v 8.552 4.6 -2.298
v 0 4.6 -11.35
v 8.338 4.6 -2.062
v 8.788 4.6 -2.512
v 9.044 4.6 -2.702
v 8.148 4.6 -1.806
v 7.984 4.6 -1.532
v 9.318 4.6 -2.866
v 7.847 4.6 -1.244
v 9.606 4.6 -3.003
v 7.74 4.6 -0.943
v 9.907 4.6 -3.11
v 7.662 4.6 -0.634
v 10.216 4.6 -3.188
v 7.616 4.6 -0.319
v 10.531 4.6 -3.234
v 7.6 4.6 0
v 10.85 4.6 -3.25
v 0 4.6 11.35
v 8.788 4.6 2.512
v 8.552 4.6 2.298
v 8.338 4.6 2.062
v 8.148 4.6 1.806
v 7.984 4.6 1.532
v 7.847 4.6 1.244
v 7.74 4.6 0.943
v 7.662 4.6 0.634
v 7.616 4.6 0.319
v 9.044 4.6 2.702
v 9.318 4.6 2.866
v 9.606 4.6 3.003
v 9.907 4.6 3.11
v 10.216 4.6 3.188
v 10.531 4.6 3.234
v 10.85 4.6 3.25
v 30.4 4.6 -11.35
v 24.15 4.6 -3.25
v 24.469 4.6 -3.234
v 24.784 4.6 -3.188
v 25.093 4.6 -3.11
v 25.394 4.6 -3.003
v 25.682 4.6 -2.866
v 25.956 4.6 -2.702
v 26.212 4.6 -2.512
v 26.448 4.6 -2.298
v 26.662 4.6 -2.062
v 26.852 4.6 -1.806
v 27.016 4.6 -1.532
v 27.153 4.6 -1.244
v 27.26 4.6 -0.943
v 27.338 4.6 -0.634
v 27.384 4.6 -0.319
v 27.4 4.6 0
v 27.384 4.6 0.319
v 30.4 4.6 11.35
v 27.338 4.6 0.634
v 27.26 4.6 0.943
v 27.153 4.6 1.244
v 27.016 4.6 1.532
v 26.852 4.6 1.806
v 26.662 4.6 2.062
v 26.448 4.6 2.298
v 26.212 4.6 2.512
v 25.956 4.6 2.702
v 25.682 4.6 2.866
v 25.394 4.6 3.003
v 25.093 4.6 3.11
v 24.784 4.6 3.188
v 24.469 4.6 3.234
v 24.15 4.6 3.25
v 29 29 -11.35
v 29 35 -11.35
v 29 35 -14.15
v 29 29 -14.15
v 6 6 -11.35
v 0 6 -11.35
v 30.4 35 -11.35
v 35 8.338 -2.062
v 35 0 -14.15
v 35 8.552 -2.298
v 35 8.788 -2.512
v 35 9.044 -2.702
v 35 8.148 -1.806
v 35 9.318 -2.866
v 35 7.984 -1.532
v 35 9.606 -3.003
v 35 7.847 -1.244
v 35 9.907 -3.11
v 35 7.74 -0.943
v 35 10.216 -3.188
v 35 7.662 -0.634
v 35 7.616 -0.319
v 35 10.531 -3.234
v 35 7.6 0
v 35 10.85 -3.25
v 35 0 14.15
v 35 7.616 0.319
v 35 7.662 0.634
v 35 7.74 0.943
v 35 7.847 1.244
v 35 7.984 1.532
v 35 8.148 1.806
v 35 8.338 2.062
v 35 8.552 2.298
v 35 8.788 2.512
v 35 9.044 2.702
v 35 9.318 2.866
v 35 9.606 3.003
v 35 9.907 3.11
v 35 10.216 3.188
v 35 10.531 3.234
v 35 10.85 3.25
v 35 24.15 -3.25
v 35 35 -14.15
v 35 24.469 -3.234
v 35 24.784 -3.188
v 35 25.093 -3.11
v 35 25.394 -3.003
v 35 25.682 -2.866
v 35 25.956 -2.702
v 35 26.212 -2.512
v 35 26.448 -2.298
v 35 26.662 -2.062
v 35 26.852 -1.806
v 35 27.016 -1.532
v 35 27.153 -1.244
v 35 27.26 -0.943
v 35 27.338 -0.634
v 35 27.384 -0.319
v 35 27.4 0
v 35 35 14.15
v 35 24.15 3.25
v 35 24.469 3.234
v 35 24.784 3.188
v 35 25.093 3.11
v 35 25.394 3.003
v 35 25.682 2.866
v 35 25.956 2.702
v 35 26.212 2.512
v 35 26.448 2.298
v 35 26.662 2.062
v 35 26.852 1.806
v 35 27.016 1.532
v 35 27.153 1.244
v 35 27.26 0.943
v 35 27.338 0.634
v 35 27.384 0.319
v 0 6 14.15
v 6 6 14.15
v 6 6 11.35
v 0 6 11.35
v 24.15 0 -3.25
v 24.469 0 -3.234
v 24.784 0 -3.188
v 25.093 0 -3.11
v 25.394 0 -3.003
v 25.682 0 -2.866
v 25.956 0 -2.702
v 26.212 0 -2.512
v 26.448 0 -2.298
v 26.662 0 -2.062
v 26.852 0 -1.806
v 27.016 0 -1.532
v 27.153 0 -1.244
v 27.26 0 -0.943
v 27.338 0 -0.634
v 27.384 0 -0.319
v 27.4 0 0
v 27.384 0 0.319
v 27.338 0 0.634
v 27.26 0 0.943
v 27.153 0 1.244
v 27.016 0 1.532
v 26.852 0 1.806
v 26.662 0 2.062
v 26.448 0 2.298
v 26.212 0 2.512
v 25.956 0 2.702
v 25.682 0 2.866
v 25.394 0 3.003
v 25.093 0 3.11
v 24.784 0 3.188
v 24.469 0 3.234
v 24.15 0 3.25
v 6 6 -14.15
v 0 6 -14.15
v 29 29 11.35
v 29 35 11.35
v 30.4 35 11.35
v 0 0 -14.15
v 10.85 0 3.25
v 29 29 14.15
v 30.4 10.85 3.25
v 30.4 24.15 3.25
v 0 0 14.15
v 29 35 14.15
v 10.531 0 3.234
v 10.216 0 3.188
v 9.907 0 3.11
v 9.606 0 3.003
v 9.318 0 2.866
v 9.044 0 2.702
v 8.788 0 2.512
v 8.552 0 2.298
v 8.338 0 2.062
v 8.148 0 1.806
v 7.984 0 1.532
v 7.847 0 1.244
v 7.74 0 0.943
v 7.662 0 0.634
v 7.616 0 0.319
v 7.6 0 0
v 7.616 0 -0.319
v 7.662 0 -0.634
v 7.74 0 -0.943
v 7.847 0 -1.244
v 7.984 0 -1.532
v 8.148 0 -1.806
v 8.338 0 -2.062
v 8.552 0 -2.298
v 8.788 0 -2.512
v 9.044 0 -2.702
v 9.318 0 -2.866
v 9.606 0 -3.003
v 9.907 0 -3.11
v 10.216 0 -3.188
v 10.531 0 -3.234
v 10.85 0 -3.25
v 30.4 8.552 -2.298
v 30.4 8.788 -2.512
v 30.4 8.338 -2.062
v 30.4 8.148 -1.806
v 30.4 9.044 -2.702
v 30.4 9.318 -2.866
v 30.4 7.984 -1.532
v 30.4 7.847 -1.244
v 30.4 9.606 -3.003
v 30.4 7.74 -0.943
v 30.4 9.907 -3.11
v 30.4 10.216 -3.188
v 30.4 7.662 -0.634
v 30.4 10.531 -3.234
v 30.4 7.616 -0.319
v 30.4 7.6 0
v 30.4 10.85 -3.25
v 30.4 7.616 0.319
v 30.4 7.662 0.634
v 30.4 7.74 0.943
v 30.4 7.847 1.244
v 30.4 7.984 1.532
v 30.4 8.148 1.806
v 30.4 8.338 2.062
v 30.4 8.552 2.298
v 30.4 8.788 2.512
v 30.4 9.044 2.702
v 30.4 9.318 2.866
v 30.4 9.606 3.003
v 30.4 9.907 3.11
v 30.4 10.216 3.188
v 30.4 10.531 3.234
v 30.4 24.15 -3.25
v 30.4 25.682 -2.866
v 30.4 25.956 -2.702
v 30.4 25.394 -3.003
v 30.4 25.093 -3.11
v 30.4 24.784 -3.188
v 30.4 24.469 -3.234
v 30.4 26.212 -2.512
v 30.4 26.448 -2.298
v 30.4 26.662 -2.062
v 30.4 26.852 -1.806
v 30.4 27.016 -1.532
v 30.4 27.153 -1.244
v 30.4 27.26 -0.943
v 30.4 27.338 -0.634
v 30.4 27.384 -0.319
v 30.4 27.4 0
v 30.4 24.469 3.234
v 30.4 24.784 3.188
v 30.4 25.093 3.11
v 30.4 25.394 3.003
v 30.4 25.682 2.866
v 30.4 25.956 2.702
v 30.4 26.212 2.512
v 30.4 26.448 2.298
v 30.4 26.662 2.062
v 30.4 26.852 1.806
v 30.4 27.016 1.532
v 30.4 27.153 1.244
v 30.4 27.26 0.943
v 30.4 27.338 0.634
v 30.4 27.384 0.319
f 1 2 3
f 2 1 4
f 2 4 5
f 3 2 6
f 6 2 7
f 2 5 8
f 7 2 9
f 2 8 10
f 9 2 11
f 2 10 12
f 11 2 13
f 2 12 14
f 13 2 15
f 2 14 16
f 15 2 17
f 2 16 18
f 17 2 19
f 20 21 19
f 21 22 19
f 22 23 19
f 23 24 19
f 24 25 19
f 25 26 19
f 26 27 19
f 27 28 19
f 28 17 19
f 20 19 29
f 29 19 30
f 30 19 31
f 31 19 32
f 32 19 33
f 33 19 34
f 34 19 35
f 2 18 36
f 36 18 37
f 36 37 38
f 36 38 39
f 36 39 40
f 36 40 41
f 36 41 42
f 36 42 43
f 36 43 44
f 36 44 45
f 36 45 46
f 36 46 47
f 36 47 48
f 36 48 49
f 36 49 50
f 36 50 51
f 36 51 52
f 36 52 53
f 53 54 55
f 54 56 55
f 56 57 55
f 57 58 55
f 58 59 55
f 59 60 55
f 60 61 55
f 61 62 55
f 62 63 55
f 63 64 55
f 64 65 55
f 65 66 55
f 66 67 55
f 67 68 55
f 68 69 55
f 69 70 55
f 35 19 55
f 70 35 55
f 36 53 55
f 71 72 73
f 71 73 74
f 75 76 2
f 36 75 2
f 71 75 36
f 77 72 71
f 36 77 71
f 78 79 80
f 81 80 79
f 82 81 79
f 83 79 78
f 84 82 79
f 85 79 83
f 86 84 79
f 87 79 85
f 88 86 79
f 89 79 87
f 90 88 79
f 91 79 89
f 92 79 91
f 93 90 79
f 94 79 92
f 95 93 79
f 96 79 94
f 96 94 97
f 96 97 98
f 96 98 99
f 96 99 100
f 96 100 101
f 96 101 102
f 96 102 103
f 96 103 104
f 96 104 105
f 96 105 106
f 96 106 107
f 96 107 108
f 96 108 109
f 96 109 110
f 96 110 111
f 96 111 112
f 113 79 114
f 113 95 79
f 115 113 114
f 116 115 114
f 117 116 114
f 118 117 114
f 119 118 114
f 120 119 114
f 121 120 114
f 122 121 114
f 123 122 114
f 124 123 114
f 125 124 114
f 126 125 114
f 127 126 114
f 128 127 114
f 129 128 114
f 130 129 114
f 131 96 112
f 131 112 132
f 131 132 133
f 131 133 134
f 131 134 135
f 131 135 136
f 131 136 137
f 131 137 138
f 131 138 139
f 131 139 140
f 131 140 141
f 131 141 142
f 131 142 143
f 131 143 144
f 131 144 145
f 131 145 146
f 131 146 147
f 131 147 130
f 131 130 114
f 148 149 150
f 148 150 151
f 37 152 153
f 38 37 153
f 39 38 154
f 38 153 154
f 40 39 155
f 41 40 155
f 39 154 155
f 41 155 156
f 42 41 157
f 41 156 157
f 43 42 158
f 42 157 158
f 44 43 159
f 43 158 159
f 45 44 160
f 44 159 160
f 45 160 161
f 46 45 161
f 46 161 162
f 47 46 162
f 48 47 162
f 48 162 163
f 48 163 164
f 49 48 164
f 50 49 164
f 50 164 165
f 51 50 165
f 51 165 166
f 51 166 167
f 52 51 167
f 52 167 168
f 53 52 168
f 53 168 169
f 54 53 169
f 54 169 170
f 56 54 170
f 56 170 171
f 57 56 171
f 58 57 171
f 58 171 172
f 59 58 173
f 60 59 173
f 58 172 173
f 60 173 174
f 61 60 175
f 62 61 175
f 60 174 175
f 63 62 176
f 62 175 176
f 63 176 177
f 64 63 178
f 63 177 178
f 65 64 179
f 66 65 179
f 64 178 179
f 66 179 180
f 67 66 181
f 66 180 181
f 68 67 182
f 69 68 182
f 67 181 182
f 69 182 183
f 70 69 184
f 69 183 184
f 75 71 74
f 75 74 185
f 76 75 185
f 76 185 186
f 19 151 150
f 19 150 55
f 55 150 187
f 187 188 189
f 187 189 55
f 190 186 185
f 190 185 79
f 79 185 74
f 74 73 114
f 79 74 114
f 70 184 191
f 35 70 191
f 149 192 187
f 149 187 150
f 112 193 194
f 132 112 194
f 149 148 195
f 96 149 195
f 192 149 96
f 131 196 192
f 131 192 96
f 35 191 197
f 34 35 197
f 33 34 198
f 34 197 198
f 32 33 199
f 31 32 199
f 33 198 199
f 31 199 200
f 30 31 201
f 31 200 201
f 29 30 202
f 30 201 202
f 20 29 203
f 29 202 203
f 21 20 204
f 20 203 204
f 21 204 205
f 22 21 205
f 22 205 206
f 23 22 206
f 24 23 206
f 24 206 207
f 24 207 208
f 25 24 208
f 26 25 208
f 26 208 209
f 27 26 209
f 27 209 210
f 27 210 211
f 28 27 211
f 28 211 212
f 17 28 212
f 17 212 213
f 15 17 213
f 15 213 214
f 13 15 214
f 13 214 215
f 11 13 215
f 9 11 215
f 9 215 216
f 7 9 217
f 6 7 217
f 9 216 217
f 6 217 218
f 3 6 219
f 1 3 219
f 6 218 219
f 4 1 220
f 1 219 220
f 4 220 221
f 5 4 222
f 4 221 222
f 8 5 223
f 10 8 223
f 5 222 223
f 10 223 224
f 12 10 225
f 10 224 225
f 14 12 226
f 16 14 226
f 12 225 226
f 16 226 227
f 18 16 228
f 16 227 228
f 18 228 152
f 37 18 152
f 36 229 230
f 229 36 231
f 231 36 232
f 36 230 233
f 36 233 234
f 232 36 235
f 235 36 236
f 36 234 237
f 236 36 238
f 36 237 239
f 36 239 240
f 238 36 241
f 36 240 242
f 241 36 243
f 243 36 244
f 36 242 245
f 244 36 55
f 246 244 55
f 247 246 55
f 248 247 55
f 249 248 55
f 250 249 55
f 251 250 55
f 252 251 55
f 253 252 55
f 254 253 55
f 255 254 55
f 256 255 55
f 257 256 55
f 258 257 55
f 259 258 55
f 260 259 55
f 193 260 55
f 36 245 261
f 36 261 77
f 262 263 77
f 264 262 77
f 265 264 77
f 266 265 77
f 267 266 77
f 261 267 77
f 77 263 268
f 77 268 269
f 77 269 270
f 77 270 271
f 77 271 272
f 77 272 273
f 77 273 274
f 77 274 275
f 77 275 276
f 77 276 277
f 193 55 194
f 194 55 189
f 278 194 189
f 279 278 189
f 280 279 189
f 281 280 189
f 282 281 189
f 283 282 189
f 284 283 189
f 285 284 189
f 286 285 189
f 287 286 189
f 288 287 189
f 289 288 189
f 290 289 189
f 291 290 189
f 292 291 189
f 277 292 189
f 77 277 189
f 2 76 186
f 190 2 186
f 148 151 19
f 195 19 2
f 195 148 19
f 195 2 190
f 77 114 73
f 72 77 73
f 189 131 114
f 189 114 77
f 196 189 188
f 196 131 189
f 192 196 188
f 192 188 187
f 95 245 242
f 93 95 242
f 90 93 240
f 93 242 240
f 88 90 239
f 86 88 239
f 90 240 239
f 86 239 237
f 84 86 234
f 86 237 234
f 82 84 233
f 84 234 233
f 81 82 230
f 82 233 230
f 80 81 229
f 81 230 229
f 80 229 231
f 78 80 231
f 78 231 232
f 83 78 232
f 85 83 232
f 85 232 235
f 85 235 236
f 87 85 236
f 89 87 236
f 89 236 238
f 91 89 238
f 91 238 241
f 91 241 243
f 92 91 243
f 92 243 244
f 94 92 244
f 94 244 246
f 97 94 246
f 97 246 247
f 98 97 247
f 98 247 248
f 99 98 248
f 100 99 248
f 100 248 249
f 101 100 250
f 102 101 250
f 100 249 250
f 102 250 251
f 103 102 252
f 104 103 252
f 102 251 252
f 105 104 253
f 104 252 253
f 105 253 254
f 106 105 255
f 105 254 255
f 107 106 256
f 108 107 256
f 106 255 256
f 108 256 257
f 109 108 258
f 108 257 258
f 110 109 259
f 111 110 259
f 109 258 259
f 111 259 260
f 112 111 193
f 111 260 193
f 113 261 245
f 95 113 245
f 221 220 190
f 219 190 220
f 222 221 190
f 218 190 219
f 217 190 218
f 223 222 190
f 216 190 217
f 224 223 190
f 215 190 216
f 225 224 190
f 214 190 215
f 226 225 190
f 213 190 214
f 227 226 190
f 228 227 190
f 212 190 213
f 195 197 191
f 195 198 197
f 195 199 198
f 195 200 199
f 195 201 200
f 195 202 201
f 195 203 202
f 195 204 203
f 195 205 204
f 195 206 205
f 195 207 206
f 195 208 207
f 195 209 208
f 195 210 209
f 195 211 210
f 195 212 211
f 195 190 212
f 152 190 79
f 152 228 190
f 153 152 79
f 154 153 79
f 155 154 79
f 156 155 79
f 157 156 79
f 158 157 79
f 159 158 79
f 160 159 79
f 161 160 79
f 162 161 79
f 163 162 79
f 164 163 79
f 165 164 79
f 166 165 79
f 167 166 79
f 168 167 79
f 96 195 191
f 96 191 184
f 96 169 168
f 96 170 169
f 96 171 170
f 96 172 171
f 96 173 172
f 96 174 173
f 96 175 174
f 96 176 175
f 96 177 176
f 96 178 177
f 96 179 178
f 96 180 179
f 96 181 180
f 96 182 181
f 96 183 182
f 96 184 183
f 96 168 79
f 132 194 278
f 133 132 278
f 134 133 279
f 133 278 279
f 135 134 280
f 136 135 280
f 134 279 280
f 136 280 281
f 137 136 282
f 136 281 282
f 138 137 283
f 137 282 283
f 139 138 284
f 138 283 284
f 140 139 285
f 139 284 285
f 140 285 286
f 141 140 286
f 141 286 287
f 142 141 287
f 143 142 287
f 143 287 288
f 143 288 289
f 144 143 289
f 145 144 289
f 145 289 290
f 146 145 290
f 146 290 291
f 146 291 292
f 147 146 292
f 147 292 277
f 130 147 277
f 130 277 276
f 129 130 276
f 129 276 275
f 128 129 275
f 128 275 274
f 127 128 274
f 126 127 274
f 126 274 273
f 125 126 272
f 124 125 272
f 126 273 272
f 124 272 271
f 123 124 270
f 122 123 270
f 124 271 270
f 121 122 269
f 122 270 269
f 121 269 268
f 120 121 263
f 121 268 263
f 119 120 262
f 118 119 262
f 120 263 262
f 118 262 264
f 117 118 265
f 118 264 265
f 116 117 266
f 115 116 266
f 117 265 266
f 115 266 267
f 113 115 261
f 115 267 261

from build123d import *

# Parameters (mm, degrees)
EXTRUDE_1_DEPTH     = 14.15
SKETCH_2_W          = 30.4
SKETCH_2_H          = 30.4
CUT_EXTRUDE_1_DEPTH = 11.35
CUT_EXTRUDE_2_REACH = 53.48
CUT_EXTRUDE_3_REACH = 53.48


with BuildPart() as part:
    # 草图1 → 凸台-拉伸1 (new, symmetric)
    with BuildSketch(Plane.XY):
        Polygon((0, 0), (35, 0), (35, 35), (29, 35), (29, 29), (6, 6), (0, 6), align=None)
    extrude(amount=EXTRUDE_1_DEPTH, both=True)

    # 草图2 → 切除-拉伸1 (cut, symmetric)
    with BuildSketch(Plane.XY):
        with Locations((15.2, 19.8)):
            Rectangle(SKETCH_2_W, SKETCH_2_H)
    extrude(amount=CUT_EXTRUDE_1_DEPTH, both=True, mode=Mode.SUBTRACT)

    # 草图4 → 切除-拉伸2 (cut, up to next)
    with BuildSketch(Plane(origin=(0, 0, 0), x_dir=(1, 0, 0), z_dir=(0, 1, 0)), mode=Mode.PRIVATE) as cut_extrude_2_sk1:
        with BuildLine():
            Line((10.85, 3.25), (24.15, 3.25))
            ThreePointArc((24.15, 3.25), (27.4, 0), (24.15, -3.25))
            Line((24.15, -3.25), (10.85, -3.25))
            ThreePointArc((10.85, -3.25), (7.6, 0), (10.85, 3.25))
        make_face()
    cut_extrude_2_tool1 = extrude(cut_extrude_2_sk1.sketch, amount=CUT_EXTRUDE_2_REACH, mode=Mode.PRIVATE) & part.part
    add(cut_extrude_2_tool1.solids().sort_by_distance((17.5, 0, 0))[0], mode=Mode.SUBTRACT)

    # 草图5 → 切除-拉伸3 (cut, up to next)
    with BuildSketch(Plane(origin=(0, 0, 0), x_dir=(0, 0, -1), z_dir=(1, 0, 0)), mode=Mode.PRIVATE) as cut_extrude_3_sk1:
        with BuildLine():
            Line((-3.25, 10.85), (-3.25, 24.15))
            ThreePointArc((-3.25, 24.15), (0, 27.4), (3.25, 24.15))
            Line((3.25, 24.15), (3.25, 10.85))
            ThreePointArc((3.25, 10.85), (0, 7.6), (-3.25, 10.85))
        make_face()
    cut_extrude_3_tool1 = extrude(cut_extrude_3_sk1.sketch, amount=CUT_EXTRUDE_3_REACH, mode=Mode.PRIVATE) & part.part
    add(cut_extrude_3_tool1.solids().sort_by_distance((0, 17.5, 0))[0], mode=Mode.SUBTRACT)


solid = part.part
